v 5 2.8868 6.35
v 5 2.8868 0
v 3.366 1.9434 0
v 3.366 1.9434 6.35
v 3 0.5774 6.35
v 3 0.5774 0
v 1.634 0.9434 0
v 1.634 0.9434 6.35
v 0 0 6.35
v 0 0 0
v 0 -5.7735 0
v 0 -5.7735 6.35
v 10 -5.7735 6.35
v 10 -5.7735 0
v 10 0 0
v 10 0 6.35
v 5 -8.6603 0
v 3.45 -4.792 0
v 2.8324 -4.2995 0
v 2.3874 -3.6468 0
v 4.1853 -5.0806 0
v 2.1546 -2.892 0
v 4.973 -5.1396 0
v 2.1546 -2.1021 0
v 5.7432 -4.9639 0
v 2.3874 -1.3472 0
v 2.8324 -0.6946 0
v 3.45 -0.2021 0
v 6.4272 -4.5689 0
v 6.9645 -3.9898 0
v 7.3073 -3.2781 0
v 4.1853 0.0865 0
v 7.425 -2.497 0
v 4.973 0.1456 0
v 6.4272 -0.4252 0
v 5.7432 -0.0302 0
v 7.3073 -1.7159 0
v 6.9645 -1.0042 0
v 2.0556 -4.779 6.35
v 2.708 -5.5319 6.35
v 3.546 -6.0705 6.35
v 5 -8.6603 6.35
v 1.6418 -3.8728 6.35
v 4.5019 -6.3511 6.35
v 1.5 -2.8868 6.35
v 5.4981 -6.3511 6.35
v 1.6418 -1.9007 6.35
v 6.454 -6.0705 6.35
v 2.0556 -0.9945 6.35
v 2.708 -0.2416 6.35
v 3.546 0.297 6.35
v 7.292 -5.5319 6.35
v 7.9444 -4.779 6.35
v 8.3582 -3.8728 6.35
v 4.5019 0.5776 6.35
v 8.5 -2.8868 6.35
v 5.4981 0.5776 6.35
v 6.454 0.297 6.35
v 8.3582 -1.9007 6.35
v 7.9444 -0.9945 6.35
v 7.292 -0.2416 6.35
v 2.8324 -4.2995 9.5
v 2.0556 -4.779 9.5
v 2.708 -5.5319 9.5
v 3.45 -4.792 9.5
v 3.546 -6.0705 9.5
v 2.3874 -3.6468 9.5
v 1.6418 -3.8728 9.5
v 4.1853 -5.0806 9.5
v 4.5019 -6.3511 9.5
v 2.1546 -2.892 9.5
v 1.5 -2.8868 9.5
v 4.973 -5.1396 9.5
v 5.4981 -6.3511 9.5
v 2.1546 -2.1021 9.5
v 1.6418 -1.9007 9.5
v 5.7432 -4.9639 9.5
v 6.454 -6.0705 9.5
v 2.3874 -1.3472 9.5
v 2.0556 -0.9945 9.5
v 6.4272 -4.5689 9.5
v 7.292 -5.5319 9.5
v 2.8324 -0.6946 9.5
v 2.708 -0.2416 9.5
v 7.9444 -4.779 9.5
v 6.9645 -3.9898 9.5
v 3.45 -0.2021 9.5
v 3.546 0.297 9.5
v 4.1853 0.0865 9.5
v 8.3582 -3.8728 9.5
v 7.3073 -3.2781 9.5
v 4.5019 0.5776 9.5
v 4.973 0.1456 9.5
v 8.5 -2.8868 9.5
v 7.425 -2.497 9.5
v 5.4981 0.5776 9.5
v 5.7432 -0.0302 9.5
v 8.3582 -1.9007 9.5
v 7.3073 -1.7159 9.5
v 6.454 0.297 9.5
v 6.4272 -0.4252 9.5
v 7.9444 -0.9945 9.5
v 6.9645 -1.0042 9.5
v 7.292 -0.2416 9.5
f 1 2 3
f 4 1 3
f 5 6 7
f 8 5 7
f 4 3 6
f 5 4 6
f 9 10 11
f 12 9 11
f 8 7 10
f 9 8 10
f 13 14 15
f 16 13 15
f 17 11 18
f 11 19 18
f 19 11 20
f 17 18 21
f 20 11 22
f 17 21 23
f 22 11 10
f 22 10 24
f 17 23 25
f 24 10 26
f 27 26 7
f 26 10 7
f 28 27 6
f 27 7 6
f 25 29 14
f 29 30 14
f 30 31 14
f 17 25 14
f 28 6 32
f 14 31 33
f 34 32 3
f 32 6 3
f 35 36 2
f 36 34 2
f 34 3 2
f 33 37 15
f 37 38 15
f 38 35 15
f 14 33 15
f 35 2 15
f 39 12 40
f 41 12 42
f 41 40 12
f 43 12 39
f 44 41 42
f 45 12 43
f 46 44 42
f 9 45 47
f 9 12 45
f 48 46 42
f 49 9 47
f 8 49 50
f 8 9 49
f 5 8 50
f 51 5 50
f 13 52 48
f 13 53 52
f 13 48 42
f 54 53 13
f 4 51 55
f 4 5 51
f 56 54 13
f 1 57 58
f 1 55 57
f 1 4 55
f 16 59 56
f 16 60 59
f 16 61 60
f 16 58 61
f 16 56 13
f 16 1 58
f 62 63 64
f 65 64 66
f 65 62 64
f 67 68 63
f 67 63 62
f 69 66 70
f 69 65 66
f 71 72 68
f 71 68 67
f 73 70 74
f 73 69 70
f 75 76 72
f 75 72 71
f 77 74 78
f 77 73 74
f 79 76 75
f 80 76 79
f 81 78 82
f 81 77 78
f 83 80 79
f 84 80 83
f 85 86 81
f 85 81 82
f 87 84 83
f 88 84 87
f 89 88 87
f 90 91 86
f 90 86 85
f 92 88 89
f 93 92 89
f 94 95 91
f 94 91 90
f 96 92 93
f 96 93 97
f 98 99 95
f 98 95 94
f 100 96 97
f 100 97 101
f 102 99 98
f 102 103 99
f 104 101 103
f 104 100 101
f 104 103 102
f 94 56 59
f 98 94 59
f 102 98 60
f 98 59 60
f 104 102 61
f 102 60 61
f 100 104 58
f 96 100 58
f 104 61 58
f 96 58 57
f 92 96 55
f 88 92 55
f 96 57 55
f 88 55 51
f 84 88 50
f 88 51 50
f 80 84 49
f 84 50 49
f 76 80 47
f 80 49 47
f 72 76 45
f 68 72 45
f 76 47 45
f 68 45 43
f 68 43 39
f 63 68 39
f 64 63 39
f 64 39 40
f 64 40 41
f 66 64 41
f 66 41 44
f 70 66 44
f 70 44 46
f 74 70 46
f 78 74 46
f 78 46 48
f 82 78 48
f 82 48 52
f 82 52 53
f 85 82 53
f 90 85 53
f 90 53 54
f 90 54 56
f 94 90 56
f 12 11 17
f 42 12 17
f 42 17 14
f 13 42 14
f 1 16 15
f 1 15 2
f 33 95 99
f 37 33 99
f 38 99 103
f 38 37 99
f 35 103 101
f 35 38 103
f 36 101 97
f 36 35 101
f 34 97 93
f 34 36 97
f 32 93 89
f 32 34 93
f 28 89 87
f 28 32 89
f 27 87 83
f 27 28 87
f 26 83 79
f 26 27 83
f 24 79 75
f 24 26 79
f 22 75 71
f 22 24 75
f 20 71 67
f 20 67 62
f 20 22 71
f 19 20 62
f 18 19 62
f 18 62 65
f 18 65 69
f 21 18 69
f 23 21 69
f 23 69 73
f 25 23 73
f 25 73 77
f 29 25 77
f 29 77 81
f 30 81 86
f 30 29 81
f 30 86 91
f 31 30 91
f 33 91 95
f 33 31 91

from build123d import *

# Parameters (mm, degrees)
F0_R     = 2.65
F0_R_2   = 3.5
F1_DEPTH = 9.5
F2_DEPTH = 6.35
F3_DEPTH = 9.501


with BuildPart() as f1:
    # F0 (on Top) → F1 (new body)
    with BuildSketch(Plane.XY):
        with Locations((4.775, -2.49704)):
            Circle(F0_R)
        with Locations((5, -2.886751)):
            Circle(F0_R_2)
        with Locations((4.775, -2.49704)):
            Circle(F0_R, mode=Mode.SUBTRACT)
    extrude(amount=F1_DEPTH)

    # F0 (on Top) → F2 (join)
    with BuildSketch(Plane.XY):
        Polygon((1.633975, 0.943376), (0, 0), (0, -5.773503), (5, -8.660254), (10, -5.773503), (10, 0), (5, 2.886751), (3.366025, 1.943376), (3, 0.57735), align=None)
        with Locations((5, -2.886751)):
            Circle(F0_R_2, mode=Mode.SUBTRACT)
    extrude(amount=F2_DEPTH)

    # F0 (on Top) → F3 (cut, through all)
    with BuildSketch(Plane.XY):
        with Locations((4.775, -2.49704)):
            Circle(F0_R)
    extrude(amount=F3_DEPTH, mode=Mode.SUBTRACT)


solid = f1.part
